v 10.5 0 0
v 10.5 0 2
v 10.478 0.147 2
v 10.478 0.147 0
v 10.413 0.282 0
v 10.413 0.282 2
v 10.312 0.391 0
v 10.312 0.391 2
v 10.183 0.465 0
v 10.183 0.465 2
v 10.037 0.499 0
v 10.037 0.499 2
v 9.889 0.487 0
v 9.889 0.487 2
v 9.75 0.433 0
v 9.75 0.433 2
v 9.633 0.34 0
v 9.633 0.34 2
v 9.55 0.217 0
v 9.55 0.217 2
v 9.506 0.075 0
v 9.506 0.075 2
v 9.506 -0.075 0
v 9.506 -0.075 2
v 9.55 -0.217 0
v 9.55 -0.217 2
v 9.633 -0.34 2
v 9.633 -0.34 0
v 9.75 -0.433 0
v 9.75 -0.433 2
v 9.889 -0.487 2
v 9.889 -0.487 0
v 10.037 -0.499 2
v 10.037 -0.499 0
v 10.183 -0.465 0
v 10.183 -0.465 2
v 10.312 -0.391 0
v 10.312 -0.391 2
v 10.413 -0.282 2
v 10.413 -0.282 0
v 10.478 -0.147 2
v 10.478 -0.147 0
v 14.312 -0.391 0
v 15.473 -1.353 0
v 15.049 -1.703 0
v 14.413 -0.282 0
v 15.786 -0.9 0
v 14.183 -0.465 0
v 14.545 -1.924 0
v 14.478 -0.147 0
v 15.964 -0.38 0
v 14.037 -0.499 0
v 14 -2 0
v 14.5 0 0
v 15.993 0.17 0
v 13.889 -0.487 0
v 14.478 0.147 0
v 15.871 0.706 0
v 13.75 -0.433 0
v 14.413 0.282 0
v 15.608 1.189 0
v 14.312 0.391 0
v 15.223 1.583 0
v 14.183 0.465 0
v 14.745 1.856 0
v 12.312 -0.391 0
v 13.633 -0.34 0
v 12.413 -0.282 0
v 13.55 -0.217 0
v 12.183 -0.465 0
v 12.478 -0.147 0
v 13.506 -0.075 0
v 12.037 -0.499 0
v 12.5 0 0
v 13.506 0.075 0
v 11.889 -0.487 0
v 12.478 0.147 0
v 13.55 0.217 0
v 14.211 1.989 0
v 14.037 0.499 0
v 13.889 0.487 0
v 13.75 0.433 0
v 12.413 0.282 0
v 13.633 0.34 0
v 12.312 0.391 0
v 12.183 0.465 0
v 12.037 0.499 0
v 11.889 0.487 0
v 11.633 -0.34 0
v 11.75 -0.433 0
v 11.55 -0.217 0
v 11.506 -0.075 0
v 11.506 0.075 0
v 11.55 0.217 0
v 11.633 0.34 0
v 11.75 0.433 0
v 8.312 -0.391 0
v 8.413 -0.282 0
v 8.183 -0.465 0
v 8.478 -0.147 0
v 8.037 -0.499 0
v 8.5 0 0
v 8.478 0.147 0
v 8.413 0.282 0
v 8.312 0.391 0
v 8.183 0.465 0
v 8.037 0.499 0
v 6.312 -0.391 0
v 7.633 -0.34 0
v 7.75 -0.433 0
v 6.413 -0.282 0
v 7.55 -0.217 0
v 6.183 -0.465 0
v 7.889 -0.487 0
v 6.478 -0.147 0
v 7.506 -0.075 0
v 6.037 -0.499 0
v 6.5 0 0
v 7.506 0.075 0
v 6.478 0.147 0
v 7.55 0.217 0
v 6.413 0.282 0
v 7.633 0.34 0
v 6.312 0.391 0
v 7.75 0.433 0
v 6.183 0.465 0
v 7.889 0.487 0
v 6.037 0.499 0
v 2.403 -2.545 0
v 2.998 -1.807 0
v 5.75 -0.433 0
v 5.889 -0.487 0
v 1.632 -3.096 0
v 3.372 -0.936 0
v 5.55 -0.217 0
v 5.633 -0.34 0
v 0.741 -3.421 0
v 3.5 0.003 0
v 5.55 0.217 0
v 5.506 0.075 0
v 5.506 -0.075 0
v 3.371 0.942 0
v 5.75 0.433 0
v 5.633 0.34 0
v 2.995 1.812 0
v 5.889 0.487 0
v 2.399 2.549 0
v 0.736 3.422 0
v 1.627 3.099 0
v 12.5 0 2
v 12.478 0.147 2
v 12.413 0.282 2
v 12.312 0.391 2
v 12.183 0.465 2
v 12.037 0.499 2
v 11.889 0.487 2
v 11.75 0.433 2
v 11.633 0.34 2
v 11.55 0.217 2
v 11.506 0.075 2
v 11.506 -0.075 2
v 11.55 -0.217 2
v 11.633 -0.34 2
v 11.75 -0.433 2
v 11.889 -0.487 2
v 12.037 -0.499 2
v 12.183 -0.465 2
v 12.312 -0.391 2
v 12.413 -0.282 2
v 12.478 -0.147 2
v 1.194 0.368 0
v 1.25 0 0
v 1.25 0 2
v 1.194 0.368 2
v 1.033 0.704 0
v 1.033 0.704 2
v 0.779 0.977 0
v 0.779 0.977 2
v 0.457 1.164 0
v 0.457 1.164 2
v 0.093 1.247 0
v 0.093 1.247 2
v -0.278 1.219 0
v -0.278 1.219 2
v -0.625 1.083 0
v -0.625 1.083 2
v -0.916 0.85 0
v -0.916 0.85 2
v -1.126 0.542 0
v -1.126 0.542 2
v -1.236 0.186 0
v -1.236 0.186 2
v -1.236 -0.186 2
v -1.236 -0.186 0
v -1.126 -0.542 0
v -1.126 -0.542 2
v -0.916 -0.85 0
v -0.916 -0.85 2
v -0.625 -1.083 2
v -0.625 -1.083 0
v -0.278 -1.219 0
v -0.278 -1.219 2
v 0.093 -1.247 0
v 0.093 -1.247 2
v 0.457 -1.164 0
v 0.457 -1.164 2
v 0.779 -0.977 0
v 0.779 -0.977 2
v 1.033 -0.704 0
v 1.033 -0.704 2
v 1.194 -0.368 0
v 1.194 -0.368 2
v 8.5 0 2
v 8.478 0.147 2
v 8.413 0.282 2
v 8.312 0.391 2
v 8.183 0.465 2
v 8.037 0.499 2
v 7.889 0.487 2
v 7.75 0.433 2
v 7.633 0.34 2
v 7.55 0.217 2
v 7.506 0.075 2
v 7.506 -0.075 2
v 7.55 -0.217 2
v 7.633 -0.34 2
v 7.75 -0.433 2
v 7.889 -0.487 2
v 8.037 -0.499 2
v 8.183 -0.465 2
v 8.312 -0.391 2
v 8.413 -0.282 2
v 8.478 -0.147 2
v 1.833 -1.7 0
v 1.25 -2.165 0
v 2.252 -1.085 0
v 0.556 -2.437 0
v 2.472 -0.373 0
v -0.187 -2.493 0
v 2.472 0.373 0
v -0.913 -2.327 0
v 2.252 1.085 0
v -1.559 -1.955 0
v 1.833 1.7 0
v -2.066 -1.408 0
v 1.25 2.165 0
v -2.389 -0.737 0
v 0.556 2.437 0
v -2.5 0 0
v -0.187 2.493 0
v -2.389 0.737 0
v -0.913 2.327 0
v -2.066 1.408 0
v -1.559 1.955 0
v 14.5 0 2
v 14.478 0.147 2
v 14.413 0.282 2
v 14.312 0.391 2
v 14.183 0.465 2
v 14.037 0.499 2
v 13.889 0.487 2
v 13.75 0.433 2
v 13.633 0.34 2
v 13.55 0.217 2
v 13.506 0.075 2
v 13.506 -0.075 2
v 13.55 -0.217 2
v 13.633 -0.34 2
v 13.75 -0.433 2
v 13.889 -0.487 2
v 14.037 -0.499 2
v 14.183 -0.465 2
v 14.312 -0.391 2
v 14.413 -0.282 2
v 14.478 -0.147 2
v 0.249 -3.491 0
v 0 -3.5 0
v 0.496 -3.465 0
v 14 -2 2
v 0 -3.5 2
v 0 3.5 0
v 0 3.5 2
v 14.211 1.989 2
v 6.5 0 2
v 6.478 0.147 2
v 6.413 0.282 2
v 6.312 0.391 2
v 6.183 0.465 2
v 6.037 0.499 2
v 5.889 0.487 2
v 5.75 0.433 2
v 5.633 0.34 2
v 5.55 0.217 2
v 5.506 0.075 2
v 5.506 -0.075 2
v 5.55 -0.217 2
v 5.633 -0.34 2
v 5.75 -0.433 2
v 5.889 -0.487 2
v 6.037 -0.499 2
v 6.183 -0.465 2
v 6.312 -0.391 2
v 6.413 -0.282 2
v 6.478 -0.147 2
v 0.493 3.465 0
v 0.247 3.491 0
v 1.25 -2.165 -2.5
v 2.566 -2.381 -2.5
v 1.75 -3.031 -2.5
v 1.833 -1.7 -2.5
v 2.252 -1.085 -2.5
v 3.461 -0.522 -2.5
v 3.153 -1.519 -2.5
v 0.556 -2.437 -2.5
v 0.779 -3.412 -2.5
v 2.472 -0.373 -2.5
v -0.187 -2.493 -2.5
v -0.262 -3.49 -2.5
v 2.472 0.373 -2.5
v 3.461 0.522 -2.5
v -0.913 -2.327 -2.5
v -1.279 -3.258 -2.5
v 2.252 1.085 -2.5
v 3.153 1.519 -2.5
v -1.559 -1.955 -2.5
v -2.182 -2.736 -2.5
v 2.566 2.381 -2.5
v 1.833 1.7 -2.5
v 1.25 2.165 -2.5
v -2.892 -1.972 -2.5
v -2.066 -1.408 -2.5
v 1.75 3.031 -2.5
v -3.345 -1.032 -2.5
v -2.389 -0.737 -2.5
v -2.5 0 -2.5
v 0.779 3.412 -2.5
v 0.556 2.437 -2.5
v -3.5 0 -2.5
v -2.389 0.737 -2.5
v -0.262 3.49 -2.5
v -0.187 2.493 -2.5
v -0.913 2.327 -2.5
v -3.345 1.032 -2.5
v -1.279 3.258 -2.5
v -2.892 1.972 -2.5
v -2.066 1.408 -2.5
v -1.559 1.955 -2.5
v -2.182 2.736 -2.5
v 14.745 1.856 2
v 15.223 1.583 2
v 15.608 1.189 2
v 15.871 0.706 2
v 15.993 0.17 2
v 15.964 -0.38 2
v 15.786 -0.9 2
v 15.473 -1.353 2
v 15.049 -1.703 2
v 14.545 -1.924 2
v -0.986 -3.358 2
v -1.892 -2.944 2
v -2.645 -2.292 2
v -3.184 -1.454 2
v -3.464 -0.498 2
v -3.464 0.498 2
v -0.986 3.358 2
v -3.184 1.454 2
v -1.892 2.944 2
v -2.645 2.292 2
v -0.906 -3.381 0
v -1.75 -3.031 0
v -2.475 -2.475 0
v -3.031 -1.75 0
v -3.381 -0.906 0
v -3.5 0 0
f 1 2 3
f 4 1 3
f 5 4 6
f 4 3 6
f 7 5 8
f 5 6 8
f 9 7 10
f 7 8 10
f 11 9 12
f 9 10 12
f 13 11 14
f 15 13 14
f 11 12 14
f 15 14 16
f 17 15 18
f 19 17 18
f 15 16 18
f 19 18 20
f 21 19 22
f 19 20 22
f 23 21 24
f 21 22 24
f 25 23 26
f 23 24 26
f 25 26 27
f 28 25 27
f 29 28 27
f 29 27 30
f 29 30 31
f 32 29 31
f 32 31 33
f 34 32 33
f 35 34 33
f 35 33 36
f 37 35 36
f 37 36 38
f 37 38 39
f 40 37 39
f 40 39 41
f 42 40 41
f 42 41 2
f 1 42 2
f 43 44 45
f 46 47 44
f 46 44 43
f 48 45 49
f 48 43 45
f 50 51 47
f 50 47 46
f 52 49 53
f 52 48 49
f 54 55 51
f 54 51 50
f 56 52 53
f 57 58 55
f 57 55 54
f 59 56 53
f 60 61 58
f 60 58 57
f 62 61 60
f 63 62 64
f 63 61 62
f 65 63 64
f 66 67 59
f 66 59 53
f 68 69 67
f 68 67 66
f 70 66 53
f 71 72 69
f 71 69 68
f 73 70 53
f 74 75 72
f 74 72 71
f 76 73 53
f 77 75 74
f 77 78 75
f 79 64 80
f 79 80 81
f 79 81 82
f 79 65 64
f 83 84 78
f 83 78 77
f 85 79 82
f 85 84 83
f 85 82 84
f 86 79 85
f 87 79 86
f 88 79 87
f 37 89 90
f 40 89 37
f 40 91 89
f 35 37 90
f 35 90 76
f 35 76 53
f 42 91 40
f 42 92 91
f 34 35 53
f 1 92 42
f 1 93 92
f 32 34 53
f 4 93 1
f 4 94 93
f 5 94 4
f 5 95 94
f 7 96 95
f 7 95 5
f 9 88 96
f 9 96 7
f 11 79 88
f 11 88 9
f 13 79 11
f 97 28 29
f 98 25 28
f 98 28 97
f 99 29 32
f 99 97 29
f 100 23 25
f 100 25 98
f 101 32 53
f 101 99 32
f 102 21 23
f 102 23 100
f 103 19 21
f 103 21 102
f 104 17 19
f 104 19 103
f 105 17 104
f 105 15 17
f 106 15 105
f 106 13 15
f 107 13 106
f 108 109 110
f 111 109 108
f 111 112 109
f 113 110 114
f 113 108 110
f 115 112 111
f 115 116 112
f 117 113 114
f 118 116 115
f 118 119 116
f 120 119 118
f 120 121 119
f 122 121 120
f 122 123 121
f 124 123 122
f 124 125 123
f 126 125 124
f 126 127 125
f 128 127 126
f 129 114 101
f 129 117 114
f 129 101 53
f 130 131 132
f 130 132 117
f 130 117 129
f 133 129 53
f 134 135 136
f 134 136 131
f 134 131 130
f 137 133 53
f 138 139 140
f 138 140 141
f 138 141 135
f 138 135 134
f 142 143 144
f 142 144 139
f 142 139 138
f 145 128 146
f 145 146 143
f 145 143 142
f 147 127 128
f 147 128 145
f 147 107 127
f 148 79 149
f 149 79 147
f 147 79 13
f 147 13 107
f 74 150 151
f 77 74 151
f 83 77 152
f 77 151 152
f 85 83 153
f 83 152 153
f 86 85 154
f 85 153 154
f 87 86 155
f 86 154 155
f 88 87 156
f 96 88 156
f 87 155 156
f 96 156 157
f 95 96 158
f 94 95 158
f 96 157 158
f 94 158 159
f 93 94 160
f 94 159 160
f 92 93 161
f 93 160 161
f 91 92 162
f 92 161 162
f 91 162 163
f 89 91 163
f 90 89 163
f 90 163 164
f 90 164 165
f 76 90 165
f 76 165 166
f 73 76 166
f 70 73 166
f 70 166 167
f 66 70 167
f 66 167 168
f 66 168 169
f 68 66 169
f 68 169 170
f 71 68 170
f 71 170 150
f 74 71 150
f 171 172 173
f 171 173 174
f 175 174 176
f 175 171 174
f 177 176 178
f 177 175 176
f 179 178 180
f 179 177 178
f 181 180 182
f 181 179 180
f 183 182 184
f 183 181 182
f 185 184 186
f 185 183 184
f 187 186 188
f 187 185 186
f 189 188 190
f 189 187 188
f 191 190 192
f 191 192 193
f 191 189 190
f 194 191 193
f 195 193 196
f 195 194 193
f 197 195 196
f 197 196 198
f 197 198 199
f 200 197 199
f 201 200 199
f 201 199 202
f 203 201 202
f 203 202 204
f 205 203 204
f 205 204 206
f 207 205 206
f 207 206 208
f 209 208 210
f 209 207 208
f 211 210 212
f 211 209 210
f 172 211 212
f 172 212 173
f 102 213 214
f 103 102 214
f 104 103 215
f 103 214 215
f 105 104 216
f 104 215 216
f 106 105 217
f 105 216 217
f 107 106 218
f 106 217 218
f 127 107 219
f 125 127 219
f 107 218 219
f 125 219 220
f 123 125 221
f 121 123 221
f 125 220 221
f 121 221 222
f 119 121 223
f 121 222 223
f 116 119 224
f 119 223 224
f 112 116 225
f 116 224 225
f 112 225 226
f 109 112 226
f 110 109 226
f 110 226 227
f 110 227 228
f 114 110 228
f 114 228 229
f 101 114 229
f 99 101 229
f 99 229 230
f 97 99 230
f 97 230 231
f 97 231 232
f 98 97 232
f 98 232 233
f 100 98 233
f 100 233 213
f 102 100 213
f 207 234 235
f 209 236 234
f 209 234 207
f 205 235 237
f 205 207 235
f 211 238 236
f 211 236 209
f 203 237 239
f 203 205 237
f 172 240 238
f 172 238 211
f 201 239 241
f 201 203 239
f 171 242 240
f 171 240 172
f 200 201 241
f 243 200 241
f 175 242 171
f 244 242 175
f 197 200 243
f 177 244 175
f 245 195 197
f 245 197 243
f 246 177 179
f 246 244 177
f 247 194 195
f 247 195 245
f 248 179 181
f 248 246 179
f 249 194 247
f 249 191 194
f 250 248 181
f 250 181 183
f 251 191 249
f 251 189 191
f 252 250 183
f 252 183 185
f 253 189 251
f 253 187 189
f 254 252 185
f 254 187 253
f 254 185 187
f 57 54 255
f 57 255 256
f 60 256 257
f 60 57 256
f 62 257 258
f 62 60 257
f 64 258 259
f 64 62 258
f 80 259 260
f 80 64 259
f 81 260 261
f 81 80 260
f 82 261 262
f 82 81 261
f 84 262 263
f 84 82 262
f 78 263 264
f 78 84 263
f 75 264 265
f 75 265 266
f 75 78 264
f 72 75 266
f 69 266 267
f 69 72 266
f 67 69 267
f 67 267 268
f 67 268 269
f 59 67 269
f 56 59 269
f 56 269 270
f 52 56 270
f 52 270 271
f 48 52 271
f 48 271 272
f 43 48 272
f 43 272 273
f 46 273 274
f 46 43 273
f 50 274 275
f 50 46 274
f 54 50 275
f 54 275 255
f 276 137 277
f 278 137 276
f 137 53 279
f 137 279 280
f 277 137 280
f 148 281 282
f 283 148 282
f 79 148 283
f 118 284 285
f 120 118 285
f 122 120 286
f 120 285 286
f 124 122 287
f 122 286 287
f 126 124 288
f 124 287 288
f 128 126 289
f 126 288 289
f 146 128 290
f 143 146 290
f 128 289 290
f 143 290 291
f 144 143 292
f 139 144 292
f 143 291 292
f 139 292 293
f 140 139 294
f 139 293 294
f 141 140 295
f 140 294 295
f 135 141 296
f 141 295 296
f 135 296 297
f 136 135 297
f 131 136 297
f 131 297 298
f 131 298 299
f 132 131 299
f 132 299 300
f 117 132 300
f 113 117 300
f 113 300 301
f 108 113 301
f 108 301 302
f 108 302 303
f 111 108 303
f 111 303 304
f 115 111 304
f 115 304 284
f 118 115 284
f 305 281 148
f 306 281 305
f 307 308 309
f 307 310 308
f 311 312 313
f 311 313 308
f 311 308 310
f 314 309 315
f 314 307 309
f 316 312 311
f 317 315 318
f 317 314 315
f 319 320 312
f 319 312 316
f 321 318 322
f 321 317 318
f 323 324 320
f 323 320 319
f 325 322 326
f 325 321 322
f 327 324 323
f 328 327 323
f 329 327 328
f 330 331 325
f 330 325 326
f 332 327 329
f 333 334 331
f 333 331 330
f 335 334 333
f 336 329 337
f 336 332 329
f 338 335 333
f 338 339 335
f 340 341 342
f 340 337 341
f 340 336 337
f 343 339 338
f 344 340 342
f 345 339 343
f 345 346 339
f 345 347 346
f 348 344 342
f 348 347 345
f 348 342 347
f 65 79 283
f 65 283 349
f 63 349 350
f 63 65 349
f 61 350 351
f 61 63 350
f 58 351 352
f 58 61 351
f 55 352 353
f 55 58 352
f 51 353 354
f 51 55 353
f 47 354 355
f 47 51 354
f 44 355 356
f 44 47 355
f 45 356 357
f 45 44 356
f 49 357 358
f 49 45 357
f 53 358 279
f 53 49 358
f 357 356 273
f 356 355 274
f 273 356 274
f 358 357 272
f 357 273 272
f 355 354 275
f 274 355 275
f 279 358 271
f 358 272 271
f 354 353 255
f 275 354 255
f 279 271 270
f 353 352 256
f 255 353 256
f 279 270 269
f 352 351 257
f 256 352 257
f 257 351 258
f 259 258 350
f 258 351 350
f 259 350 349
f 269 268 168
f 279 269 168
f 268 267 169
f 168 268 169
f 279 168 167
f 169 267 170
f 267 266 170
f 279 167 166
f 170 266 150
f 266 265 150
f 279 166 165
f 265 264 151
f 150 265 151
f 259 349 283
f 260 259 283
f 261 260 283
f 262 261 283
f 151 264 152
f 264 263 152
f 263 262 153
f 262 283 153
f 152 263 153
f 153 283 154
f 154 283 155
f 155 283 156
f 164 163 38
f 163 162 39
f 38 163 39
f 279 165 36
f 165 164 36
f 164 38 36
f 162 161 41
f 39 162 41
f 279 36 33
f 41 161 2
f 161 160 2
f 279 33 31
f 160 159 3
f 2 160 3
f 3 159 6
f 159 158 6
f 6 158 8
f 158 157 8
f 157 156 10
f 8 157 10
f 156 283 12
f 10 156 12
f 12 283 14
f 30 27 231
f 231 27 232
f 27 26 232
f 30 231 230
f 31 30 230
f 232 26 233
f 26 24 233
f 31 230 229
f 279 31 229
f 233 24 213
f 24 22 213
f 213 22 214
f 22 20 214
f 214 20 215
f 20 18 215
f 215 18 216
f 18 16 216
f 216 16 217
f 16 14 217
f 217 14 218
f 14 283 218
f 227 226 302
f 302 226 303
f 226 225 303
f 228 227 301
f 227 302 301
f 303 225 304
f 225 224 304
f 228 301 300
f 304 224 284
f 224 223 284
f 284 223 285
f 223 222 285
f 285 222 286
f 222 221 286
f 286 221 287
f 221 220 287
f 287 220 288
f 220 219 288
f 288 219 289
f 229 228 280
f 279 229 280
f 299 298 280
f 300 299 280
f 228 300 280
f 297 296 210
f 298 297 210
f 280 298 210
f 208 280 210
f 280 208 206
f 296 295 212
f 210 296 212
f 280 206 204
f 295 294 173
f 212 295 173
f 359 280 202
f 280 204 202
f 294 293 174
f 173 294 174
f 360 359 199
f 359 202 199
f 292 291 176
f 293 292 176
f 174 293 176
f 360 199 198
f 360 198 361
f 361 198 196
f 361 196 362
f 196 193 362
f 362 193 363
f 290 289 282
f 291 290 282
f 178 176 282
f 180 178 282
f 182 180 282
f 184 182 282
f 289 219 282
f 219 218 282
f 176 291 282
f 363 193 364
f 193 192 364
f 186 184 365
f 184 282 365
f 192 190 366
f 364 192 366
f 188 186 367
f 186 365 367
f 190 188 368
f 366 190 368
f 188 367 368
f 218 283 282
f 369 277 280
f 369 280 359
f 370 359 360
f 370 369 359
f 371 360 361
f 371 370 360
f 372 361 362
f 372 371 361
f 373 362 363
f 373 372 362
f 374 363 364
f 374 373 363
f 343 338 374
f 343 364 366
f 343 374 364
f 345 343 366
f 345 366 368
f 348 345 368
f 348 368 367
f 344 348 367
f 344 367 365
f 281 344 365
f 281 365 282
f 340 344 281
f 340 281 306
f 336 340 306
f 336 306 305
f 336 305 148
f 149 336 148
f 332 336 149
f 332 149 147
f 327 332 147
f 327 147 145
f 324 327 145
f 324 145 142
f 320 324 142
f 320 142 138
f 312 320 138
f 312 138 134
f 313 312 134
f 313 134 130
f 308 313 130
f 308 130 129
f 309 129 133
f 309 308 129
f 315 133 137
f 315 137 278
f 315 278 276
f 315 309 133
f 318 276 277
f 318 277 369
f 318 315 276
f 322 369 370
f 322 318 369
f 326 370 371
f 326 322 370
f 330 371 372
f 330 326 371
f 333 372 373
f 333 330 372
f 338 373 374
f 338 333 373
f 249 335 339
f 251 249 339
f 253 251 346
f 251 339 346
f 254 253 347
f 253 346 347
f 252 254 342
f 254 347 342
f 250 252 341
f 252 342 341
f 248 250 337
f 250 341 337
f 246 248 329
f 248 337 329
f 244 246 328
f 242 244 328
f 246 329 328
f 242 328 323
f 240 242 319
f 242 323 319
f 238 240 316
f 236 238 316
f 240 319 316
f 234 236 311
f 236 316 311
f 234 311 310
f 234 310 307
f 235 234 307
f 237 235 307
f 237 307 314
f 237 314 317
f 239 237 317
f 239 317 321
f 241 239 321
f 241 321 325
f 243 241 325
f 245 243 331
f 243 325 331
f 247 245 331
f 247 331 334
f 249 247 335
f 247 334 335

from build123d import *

# Parameters (mm, degrees)
SKETCH_1_R          = 1.25
SKETCH_1_R_2        = 0.5
EXTRUDE_1_DEPTH     = 2
CUT_EXTRUDE_1_REACH = 18.5
SKETCH_2_R          = 0.5
EXTRUDE_START       = 2.5
SKETCH_3_R          = 3.5
SKETCH_3_R_2        = 2.5
EXTRUDE_2_DEPTH     = 2.5


with BuildPart() as part:
    # 草圖1 → 填料-伸長1 (new body)
    with BuildSketch(Plane.XY):
        with BuildLine():
            Line((0, 3.5), (14.211482552, 1.988787352))
            ThreePointArc((14.211482552, 1.988787352), (15.997194871, -0.105889793), (14, -2))
            Line((14, -2), (0, -3.5))
            ThreePointArc((0, -3.5), (-3.5, 0), (0, 3.5))
        make_face()
        Circle(SKETCH_1_R, mode=Mode.SUBTRACT)
        with Locations((14, 0)):
            Circle(SKETCH_1_R_2, mode=Mode.SUBTRACT)
    extrude(amount=EXTRUDE_1_DEPTH)

    # 草圖2 → 除料-伸長1 (cut, up to next)
    with BuildSketch(Plane.XY.offset(2), mode=Mode.PRIVATE) as cut_extrude_1_sk1:
        with Locations((12, 0)):
            Circle(SKETCH_2_R)
    cut_extrude_1_tool1 = extrude(cut_extrude_1_sk1.sketch, amount=-CUT_EXTRUDE_1_REACH, mode=Mode.PRIVATE) & part.part
    # 草圖2 → 除料-伸長1 (cut, up to next)
    with BuildSketch(Plane.XY.offset(2), mode=Mode.PRIVATE) as cut_extrude_1_sk2:
        with Locations((10, 0)):
            Circle(SKETCH_2_R)
    cut_extrude_1_tool2 = extrude(cut_extrude_1_sk2.sketch, amount=-CUT_EXTRUDE_1_REACH, mode=Mode.PRIVATE) & part.part
    # 草圖2 → 除料-伸長1 (cut, up to next)
    with BuildSketch(Plane.XY.offset(2), mode=Mode.PRIVATE) as cut_extrude_1_sk3:
        with Locations((8, 0)):
            Circle(SKETCH_2_R)
    cut_extrude_1_tool3 = extrude(cut_extrude_1_sk3.sketch, amount=-CUT_EXTRUDE_1_REACH, mode=Mode.PRIVATE) & part.part
    # 草圖2 → 除料-伸長1 (cut, up to next)
    with BuildSketch(Plane.XY.offset(2), mode=Mode.PRIVATE) as cut_extrude_1_sk4:
        with Locations((6, 0)):
            Circle(SKETCH_2_R)
    cut_extrude_1_tool4 = extrude(cut_extrude_1_sk4.sketch, amount=-CUT_EXTRUDE_1_REACH, mode=Mode.PRIVATE) & part.part
    add(cut_extrude_1_tool1.solids().sort_by_distance((12, 0, 2))[0], mode=Mode.SUBTRACT)
    add(cut_extrude_1_tool2.solids().sort_by_distance((10, 0, 2))[0], mode=Mode.SUBTRACT)
    add(cut_extrude_1_tool3.solids().sort_by_distance((8, 0, 2))[0], mode=Mode.SUBTRACT)
    add(cut_extrude_1_tool4.solids().sort_by_distance((6, 0, 2))[0], mode=Mode.SUBTRACT)

    # 草圖3 → 填料-伸長2 (add)
    with BuildSketch(Plane(origin=(0, 0, 0), x_dir=(-1, 0, 0), z_dir=(0, 0, -1)).offset(EXTRUDE_START)):
        Circle(SKETCH_3_R)
        Circle(SKETCH_3_R_2, mode=Mode.SUBTRACT)
    extrude(amount=-EXTRUDE_2_DEPTH)


solid = part.part
